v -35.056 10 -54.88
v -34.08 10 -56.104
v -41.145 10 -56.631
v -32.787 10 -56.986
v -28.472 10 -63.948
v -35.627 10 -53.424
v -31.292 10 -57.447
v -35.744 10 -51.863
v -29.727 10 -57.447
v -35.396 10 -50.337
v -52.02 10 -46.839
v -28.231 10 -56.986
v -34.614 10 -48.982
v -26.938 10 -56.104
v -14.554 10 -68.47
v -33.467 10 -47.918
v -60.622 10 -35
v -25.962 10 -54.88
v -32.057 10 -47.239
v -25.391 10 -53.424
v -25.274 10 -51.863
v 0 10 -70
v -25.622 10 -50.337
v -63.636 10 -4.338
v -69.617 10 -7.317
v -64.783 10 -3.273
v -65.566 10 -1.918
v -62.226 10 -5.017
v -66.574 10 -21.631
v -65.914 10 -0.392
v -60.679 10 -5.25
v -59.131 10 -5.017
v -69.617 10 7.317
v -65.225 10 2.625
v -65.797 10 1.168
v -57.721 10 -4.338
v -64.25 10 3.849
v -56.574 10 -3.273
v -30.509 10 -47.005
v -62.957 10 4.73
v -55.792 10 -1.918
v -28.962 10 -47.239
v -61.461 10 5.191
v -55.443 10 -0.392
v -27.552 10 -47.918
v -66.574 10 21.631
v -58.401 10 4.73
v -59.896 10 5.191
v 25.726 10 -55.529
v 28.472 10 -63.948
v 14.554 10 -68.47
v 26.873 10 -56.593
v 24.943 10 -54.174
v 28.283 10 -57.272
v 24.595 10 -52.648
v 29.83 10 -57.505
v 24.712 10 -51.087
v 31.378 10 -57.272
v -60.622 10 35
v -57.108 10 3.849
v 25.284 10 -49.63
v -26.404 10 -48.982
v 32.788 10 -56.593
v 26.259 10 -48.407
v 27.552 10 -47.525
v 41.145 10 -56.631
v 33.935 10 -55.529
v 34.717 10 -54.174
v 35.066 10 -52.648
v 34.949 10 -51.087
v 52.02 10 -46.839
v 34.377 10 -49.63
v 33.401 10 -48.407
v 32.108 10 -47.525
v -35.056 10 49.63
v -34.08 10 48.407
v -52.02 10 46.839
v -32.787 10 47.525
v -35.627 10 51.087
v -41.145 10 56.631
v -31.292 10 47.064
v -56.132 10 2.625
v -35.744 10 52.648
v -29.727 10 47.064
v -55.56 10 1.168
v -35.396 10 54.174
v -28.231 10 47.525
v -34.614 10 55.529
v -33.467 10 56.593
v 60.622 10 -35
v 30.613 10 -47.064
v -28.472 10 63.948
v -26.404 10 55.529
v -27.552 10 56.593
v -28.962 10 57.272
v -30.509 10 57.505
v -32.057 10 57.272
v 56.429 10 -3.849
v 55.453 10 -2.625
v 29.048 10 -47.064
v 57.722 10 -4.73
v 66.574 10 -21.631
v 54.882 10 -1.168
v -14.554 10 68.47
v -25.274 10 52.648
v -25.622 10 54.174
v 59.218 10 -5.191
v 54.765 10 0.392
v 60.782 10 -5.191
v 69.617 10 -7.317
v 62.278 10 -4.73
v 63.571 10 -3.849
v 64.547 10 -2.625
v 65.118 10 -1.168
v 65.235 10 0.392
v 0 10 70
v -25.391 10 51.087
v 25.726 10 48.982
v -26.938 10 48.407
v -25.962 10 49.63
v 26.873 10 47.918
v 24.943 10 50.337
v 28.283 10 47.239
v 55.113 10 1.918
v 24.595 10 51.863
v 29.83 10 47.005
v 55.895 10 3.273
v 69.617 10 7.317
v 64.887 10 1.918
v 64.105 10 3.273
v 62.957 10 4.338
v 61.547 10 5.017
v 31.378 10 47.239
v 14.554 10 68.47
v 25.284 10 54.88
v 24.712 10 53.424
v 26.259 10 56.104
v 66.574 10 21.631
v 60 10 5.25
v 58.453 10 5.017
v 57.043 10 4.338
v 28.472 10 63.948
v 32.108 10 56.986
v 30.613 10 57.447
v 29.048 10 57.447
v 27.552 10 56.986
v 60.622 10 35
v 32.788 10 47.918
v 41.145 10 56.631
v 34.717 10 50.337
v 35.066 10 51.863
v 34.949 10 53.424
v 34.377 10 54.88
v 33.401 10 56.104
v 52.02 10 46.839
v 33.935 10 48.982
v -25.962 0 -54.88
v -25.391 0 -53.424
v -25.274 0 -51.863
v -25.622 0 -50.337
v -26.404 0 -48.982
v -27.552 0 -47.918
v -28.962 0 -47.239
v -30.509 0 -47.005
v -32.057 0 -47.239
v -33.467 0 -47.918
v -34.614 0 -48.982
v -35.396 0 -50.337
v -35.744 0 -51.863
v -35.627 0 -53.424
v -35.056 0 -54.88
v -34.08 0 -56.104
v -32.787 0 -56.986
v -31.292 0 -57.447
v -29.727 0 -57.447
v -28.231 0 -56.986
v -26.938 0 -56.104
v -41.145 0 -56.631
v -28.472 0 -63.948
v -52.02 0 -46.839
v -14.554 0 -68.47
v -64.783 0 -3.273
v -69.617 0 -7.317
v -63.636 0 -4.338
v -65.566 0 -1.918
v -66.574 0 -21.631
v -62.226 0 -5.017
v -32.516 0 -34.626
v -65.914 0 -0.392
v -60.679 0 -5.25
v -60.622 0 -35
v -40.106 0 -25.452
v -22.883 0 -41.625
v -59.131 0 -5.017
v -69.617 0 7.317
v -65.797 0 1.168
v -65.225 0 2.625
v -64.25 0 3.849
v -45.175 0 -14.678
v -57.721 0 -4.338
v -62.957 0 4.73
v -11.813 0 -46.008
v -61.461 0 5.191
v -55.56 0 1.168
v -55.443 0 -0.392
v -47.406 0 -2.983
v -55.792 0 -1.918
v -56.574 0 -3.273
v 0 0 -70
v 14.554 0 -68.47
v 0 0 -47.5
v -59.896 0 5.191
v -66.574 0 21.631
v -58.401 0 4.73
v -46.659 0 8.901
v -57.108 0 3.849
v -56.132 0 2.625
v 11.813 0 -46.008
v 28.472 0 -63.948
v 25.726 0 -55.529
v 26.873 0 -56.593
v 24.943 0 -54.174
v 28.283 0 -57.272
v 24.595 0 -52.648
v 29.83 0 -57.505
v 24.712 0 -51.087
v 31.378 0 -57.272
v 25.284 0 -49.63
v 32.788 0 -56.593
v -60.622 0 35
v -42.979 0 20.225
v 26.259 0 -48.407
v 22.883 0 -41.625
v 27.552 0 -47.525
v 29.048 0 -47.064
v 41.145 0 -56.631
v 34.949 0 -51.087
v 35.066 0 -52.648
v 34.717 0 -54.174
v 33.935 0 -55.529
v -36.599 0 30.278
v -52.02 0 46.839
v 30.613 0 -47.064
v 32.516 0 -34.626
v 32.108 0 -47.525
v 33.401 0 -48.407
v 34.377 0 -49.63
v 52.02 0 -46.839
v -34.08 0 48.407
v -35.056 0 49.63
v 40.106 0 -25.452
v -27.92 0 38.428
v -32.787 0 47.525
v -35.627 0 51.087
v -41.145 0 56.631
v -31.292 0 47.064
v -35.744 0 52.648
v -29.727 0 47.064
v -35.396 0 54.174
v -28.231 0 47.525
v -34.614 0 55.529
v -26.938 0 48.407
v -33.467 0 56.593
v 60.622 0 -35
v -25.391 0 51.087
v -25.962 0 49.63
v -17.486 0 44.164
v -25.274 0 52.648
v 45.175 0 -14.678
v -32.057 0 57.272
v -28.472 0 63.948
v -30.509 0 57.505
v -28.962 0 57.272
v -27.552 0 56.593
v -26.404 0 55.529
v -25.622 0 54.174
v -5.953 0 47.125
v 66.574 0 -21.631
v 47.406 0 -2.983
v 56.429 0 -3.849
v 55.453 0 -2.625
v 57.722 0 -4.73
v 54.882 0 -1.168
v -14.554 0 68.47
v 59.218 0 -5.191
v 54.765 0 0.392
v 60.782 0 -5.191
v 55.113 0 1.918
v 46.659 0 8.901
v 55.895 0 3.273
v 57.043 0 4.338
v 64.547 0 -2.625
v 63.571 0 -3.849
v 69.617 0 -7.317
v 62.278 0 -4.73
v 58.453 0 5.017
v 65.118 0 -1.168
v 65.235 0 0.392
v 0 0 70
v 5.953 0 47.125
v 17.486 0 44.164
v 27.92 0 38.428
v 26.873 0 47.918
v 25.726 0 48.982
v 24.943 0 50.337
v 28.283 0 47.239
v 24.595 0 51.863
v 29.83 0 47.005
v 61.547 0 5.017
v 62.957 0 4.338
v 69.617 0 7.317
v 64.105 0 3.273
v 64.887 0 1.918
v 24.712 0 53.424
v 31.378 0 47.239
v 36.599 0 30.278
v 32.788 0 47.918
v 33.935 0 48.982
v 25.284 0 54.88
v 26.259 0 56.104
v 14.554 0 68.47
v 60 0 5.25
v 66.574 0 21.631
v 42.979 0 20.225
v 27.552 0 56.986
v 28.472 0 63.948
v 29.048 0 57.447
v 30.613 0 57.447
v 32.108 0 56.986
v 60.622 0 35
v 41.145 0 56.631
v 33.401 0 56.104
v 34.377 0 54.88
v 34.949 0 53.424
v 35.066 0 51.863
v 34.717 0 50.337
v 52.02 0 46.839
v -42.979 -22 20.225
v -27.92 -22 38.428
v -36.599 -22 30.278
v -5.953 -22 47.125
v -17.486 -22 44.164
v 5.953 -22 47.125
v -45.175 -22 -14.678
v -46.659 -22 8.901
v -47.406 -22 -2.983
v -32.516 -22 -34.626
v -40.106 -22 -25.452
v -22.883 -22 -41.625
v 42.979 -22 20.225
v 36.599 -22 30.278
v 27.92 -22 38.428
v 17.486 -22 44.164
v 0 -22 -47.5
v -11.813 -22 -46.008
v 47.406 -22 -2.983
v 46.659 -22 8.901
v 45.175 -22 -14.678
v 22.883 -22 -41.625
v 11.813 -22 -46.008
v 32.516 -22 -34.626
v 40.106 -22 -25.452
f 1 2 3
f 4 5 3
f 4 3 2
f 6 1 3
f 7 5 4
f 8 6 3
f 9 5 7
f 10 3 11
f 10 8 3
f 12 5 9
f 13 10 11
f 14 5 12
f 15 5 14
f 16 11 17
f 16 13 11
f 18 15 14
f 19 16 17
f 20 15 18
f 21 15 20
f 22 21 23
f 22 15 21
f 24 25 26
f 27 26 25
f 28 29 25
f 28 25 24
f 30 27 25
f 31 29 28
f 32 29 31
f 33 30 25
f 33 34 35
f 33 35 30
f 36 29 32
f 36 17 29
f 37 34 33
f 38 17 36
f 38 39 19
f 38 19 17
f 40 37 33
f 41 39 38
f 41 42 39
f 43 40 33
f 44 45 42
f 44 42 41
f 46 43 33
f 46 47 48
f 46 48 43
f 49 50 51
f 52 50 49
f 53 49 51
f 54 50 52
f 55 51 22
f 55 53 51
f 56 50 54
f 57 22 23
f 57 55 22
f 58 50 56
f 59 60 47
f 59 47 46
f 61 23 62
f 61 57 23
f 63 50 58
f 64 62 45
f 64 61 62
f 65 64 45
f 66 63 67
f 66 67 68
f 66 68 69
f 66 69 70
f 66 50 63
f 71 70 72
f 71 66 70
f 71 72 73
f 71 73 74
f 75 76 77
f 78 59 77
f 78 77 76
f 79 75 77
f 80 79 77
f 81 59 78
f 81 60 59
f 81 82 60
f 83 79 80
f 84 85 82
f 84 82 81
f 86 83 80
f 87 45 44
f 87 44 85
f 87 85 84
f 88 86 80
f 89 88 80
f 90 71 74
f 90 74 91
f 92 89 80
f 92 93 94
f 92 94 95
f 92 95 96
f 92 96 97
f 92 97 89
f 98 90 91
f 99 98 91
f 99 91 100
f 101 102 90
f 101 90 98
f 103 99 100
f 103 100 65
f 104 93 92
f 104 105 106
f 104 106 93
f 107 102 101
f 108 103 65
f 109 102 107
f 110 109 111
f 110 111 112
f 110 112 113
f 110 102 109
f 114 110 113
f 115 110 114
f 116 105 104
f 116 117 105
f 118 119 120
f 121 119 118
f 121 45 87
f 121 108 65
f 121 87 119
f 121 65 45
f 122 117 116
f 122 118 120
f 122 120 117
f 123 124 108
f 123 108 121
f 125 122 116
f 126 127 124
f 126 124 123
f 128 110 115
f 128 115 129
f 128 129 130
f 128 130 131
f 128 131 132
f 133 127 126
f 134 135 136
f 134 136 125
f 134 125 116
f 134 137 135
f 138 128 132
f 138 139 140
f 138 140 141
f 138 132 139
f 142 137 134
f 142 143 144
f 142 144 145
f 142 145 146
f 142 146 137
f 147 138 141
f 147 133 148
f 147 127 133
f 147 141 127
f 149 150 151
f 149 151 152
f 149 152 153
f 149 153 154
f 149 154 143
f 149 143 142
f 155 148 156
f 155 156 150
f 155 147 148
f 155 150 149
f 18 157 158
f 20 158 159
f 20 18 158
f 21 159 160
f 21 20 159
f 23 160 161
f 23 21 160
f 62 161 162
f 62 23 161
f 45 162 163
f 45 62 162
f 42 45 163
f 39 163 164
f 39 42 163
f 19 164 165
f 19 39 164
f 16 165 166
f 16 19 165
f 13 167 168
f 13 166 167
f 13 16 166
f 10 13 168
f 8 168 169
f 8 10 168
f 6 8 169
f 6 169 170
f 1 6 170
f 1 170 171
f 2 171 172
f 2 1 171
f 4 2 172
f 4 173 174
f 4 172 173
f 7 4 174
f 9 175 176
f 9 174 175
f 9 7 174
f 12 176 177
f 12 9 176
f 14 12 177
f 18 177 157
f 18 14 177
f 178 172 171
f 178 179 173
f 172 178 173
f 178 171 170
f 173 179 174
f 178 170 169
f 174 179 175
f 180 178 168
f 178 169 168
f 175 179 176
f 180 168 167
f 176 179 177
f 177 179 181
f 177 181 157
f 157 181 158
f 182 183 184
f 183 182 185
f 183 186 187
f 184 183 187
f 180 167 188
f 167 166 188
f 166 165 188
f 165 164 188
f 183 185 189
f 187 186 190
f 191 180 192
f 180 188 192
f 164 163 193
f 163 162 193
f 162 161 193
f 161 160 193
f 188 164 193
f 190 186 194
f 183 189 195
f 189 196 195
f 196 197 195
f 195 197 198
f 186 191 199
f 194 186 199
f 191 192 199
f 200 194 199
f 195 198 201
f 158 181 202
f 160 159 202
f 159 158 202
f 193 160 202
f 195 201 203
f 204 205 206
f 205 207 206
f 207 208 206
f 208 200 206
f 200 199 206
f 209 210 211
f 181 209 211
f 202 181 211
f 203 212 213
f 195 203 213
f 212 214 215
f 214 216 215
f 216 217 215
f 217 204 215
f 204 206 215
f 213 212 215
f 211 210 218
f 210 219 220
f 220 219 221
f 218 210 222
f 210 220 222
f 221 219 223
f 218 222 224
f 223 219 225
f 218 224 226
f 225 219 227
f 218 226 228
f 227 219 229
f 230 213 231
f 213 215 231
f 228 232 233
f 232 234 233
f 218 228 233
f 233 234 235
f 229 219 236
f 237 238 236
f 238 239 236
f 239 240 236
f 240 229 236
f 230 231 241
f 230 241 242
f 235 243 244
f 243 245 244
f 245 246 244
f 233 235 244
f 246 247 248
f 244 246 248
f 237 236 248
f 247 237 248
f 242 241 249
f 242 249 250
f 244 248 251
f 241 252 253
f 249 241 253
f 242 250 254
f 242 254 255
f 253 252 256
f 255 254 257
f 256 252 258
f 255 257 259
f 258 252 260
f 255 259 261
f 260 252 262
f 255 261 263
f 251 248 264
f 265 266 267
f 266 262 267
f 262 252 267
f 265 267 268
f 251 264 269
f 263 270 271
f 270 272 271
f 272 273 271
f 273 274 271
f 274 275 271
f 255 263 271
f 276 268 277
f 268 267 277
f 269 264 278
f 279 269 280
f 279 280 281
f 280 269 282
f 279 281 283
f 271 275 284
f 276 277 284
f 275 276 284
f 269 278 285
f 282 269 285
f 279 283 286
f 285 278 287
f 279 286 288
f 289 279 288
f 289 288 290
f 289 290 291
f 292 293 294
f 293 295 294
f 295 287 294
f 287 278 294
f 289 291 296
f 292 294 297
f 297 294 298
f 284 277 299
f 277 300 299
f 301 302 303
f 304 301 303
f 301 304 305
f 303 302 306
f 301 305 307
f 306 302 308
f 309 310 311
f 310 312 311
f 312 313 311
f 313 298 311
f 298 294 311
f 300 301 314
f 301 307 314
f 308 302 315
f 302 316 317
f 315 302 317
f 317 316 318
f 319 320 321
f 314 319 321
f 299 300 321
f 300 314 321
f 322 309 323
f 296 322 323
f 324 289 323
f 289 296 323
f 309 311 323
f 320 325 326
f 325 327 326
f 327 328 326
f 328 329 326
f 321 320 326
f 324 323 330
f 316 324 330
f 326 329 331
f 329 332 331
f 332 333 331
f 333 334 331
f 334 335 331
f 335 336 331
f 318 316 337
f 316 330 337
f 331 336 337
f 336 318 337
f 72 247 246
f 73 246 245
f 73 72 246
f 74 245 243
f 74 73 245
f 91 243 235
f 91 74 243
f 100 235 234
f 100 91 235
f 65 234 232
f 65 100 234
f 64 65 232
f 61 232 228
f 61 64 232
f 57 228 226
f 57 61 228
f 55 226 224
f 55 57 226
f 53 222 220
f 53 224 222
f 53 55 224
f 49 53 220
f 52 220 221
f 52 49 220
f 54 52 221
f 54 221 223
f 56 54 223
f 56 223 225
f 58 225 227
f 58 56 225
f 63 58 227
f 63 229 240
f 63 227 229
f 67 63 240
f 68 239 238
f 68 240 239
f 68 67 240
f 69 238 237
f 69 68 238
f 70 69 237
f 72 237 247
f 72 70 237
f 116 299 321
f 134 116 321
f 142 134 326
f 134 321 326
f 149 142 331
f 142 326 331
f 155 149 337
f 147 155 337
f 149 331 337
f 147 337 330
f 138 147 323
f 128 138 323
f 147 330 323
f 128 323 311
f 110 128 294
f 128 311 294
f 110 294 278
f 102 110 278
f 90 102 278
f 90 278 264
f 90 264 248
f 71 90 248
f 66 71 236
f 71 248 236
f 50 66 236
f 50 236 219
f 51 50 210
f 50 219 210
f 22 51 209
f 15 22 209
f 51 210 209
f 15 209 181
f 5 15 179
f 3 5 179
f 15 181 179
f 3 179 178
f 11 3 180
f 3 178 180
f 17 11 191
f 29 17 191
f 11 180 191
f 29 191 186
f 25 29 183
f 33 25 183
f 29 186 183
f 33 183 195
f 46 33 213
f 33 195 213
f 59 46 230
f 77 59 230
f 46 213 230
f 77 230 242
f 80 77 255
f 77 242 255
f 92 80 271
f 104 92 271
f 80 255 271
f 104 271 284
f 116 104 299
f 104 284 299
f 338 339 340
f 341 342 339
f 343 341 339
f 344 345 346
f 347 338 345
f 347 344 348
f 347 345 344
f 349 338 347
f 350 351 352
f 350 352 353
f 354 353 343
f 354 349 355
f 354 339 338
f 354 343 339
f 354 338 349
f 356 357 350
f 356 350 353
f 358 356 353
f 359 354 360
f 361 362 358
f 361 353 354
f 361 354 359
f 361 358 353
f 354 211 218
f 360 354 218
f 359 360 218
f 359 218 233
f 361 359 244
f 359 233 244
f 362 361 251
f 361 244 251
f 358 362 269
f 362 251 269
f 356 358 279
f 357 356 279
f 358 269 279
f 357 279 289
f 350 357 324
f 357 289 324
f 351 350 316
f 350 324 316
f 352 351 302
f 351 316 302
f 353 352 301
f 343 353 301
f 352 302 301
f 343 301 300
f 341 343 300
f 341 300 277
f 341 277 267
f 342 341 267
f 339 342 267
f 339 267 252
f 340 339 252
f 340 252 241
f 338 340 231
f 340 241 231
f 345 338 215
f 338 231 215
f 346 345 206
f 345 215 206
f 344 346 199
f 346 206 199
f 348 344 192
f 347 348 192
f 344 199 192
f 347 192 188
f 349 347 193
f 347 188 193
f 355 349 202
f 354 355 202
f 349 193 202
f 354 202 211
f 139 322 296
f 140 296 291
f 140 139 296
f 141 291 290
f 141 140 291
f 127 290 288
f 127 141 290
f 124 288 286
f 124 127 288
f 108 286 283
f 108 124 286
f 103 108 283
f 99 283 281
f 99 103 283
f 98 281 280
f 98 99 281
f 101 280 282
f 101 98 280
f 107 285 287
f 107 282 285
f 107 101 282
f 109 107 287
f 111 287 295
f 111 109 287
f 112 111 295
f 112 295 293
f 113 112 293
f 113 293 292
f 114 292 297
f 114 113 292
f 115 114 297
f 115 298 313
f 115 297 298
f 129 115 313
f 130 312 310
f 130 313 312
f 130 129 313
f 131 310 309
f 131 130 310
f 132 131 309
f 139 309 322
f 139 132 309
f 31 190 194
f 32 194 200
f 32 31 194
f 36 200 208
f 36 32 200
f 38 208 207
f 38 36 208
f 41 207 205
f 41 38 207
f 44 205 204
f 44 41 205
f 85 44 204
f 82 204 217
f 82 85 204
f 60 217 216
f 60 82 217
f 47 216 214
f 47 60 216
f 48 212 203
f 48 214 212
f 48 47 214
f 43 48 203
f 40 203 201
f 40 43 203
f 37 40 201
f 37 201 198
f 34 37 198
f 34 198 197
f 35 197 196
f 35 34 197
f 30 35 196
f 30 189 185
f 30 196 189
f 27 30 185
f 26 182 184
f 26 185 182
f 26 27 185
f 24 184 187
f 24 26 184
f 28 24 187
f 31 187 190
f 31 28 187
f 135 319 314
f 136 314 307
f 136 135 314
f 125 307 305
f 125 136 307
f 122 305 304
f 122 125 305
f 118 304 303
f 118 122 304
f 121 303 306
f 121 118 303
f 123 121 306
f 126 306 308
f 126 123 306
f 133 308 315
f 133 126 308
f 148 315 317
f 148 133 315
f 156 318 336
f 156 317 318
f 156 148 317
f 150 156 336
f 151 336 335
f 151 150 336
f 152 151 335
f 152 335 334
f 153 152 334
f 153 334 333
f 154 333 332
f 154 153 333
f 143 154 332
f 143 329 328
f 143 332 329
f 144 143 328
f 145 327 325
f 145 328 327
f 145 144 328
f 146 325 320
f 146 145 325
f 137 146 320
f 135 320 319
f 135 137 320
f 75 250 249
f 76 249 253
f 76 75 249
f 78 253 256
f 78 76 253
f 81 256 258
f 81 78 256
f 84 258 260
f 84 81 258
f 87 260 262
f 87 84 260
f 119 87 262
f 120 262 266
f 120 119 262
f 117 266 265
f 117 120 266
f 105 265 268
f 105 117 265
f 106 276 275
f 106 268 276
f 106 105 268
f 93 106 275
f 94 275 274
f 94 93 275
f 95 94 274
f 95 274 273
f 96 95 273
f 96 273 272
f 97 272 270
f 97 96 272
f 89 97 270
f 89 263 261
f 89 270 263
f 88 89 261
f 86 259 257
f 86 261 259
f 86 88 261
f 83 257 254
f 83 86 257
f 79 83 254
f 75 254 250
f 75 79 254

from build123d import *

# Parameters (mm, degrees)
CROQUIS1_R              = 70
SALIENTE_EXTRUIR1_DEPTH = 10
CROQUIS4_R              = 47.5
SALIENTE_EXTRUIR2_DEPTH = 22
MATRIZC1_COUNT          = 6


with BuildPart() as part:
    # Croquis1 → Saliente-Extruir1 (new body)
    with BuildSketch(Plane(origin=(0, 0, 0), x_dir=(1, 0, 0), z_dir=(0, 1, 0))):
        with Locations(Location((0, 0, 0), (0, 0, 270))):
            Circle(CROQUIS1_R)
    extrude(amount=SALIENTE_EXTRUIR1_DEPTH)

    # Croquis4 → Saliente-Extruir2 (add)
    with BuildSketch(Plane(origin=(0, 0, 0), x_dir=(-1, 0, 0), z_dir=(0, -1, 0))):
        with Locations(Location((0, 0, 0), (0, 0, 90))):
            Circle(CROQUIS4_R)
    extrude(amount=SALIENTE_EXTRUIR2_DEPTH)

    # Croquis6 → Taladro roscado M12x1.51 (revolve, cut)
    with BuildSketch(Plane(origin=(60, 10, 0), x_dir=(0, 0, 1), z_dir=(1, 0, 0))):
        Polygon((0, 0), (0, 34.65451825), (5.25, 31.5), (5.25, 0), align=None)
    taladro_roscado_m12x1_51 = revolve(axis=Axis((60, 16.35, 0), (0, -1, 0)), mode=Mode.SUBTRACT)

    # MatrizC1: Taladro roscado M12x1.51 ×6 about axis
    matrizc1_axis = Axis((-0.339409177, 0, 0), (0, 1, 0))
    for i in range(1, MATRIZC1_COUNT):
        add(taladro_roscado_m12x1_51.rotate(matrizc1_axis, i * 360 / MATRIZC1_COUNT), mode=Mode.SUBTRACT)


solid = part.part
